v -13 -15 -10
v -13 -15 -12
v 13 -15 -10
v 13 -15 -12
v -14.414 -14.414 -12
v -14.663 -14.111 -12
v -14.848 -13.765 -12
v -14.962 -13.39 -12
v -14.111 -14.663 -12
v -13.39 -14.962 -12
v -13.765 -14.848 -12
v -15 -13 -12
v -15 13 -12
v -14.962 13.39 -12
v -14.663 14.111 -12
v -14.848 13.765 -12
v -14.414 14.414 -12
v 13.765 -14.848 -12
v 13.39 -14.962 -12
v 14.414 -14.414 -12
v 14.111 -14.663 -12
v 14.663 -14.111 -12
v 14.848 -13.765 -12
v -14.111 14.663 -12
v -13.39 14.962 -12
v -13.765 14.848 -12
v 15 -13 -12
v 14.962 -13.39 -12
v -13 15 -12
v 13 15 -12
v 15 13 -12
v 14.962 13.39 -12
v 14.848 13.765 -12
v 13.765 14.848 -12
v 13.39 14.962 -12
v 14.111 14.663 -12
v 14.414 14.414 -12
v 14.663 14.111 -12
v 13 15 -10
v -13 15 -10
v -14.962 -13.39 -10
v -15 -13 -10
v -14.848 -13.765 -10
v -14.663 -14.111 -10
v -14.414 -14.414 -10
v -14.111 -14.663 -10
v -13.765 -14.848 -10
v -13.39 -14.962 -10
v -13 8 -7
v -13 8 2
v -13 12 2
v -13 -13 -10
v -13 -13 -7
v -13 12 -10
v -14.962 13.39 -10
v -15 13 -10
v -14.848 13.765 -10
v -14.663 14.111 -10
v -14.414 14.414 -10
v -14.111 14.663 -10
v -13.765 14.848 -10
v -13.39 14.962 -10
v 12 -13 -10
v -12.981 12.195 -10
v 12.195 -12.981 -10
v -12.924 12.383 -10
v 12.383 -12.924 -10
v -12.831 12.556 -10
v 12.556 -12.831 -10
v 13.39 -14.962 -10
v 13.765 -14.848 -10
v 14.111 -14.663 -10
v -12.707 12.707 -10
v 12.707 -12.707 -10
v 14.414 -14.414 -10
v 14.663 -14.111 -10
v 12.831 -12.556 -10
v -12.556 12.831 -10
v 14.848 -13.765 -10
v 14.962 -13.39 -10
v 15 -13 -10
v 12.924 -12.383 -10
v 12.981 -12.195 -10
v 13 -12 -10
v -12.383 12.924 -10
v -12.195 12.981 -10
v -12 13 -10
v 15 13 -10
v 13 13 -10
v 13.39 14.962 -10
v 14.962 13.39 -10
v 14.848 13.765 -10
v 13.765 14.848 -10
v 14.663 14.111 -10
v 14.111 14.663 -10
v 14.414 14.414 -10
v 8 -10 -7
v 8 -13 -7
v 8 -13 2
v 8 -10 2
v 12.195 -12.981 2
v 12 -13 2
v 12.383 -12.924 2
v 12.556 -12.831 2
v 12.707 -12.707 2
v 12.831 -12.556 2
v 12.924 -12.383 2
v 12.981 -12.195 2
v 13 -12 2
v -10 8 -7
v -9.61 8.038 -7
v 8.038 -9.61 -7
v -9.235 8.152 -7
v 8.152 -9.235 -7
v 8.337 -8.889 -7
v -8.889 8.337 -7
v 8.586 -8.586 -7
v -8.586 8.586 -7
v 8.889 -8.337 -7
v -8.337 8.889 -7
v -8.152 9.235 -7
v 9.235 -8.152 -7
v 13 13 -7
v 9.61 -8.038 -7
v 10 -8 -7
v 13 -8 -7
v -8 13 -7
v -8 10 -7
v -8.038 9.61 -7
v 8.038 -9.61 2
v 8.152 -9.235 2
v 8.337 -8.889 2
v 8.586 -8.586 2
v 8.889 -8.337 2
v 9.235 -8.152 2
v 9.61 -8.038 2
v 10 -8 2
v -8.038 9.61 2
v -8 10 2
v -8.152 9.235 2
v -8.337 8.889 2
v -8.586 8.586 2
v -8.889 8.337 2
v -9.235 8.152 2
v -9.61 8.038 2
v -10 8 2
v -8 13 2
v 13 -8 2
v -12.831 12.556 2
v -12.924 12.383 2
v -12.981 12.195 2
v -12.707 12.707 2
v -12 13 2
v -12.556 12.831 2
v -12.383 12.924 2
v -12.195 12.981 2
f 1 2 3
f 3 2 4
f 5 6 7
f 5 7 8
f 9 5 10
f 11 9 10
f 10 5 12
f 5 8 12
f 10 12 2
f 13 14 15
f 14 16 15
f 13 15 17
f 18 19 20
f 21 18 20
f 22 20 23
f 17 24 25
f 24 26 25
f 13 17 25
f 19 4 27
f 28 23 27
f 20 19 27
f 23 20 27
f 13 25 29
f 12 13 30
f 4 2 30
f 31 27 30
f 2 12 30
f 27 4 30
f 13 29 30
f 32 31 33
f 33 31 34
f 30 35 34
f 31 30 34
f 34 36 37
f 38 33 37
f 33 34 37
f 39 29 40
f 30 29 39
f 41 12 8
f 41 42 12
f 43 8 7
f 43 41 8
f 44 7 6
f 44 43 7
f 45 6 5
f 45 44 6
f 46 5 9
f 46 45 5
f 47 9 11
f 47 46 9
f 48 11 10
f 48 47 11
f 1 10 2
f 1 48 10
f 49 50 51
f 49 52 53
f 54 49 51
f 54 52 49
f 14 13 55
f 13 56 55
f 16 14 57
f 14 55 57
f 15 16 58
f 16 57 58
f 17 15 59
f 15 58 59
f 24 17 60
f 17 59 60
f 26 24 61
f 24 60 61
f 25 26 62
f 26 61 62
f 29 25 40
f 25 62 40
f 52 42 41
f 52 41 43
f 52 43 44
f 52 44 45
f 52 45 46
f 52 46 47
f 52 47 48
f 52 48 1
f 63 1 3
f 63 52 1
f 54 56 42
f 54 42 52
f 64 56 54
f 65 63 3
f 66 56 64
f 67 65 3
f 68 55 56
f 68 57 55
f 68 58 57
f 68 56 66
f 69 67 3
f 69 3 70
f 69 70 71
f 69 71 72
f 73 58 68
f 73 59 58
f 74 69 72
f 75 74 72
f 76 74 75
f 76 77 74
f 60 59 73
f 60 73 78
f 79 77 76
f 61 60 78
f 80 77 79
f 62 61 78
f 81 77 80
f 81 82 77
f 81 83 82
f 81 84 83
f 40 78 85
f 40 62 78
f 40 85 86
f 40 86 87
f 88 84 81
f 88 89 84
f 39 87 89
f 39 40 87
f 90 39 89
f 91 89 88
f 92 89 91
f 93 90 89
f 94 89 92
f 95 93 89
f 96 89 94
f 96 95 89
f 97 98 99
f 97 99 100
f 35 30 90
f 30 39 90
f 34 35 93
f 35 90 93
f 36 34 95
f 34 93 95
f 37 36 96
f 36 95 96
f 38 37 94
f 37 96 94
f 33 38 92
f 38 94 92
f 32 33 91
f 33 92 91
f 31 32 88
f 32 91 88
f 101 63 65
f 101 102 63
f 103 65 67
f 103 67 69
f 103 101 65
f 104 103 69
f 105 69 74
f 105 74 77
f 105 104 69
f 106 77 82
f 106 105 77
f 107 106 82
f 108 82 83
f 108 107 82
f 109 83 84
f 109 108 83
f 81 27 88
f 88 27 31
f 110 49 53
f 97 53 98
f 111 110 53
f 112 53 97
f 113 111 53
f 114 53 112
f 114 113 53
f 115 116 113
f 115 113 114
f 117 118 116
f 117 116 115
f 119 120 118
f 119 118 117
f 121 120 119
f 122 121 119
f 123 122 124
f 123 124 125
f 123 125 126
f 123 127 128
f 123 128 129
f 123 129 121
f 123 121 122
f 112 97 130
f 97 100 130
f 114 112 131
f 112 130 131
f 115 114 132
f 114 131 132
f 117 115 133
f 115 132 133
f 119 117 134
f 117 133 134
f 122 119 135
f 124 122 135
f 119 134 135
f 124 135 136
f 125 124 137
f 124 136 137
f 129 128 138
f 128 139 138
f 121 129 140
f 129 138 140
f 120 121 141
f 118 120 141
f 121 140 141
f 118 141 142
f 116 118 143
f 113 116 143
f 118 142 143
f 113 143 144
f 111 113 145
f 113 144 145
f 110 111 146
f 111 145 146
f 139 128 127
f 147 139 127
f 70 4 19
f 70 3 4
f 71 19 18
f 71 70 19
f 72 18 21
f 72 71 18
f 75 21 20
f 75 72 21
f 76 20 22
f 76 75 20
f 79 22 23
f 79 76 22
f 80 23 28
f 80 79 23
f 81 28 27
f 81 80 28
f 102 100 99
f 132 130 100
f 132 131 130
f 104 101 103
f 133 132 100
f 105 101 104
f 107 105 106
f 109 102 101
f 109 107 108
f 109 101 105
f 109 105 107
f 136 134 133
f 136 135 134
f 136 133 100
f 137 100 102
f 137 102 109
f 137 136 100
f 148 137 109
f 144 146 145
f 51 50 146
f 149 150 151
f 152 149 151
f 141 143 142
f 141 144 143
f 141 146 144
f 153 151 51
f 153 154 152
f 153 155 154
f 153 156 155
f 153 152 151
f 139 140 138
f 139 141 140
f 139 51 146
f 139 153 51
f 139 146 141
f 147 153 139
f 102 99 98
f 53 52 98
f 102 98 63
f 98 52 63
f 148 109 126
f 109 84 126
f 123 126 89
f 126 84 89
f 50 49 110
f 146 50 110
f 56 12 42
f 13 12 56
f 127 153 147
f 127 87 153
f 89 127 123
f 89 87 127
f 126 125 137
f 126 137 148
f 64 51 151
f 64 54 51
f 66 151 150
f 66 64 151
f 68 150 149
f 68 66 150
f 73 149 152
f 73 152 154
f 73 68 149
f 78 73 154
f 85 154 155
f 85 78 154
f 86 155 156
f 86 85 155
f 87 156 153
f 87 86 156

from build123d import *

# Parameters (mm, degrees)
BOX013_W     = 26
BOX013_H     = 26
BOX013_DEPTH = 3
BOX014_W     = 5
BOX014_H     = 5
BOX014_DEPTH = 9
BOX012_W     = 30
BOX012_H     = 30
BOX012_DEPTH = 2
BOX015_W     = 5
BOX015_H     = 5
BOX015_DEPTH = 9
FILLET001_R  = 2
FILLET002_R  = 2
FILLET003_R  = 1


with BuildPart() as kapakic:
    # Box013 → Box013 (new body)
    with BuildSketch(Plane(origin=(-13, -13, -10), x_dir=(1, 0, 0), z_dir=(0, 0, 1))):
        with Locations((13, 13)):
            Rectangle(BOX013_W, BOX013_H)
    extrude(amount=BOX013_DEPTH)


with BuildPart() as kapakcikinti1:
    # Box014 → Box014 (new body)
    with BuildSketch(Plane(origin=(-13, 8, -7), x_dir=(1, 0, 0), z_dir=(0, 0, 1))):
        with Locations((2.5, 2.5)):
            Rectangle(BOX014_W, BOX014_H)
    extrude(amount=BOX014_DEPTH)


with BuildPart() as kapakgenis:
    # Box012 → Box012 (new body)
    with BuildSketch(Plane(origin=(-15, -15, -12), x_dir=(1, 0, 0), z_dir=(0, 0, 1))):
        with Locations((15, 15)):
            Rectangle(BOX012_W, BOX012_H)
    extrude(amount=BOX012_DEPTH)


with BuildPart() as fillet003:
    # Box015 → Box015 (new body)
    with BuildSketch(Plane(origin=(8, -13, -7), x_dir=(1, 0, 0), z_dir=(0, 0, 1))):
        with Locations((2.5, 2.5)):
            Rectangle(BOX015_W, BOX015_H)
    extrude(amount=BOX015_DEPTH)

    # Fusion004: union KapakIc, KapakCikinti1, KapakGenis
    add(kapakic.part)
    add(kapakcikinti1.part)
    add(kapakgenis.part)

    # Fillet001
    fillet001_edges = [fillet003.edges().sort_by_distance(p)[0] for p in [
        (-15, -15, -11),
        (-15, 15, -11),
        (15, 15, -11),
        (15, -15, -11),
    ]]
    fillet(fillet001_edges, radius=FILLET001_R)

    # Fillet002
    fillet002_edges = [fillet003.edges().sort_by_distance(p)[0] for p in [
        (-8, 8, -2.5),
        (8, -8, -2.5),
    ]]
    fillet(fillet002_edges, radius=FILLET002_R)

    # Fillet003
    fillet003_edges = [fillet003.edges().sort_by_distance(p)[0] for p in [
        (-13, 13, -2.5),
        (13, -13, -2.5),
    ]]
    fillet(fillet003_edges, radius=FILLET003_R)


solid = fillet003.part
